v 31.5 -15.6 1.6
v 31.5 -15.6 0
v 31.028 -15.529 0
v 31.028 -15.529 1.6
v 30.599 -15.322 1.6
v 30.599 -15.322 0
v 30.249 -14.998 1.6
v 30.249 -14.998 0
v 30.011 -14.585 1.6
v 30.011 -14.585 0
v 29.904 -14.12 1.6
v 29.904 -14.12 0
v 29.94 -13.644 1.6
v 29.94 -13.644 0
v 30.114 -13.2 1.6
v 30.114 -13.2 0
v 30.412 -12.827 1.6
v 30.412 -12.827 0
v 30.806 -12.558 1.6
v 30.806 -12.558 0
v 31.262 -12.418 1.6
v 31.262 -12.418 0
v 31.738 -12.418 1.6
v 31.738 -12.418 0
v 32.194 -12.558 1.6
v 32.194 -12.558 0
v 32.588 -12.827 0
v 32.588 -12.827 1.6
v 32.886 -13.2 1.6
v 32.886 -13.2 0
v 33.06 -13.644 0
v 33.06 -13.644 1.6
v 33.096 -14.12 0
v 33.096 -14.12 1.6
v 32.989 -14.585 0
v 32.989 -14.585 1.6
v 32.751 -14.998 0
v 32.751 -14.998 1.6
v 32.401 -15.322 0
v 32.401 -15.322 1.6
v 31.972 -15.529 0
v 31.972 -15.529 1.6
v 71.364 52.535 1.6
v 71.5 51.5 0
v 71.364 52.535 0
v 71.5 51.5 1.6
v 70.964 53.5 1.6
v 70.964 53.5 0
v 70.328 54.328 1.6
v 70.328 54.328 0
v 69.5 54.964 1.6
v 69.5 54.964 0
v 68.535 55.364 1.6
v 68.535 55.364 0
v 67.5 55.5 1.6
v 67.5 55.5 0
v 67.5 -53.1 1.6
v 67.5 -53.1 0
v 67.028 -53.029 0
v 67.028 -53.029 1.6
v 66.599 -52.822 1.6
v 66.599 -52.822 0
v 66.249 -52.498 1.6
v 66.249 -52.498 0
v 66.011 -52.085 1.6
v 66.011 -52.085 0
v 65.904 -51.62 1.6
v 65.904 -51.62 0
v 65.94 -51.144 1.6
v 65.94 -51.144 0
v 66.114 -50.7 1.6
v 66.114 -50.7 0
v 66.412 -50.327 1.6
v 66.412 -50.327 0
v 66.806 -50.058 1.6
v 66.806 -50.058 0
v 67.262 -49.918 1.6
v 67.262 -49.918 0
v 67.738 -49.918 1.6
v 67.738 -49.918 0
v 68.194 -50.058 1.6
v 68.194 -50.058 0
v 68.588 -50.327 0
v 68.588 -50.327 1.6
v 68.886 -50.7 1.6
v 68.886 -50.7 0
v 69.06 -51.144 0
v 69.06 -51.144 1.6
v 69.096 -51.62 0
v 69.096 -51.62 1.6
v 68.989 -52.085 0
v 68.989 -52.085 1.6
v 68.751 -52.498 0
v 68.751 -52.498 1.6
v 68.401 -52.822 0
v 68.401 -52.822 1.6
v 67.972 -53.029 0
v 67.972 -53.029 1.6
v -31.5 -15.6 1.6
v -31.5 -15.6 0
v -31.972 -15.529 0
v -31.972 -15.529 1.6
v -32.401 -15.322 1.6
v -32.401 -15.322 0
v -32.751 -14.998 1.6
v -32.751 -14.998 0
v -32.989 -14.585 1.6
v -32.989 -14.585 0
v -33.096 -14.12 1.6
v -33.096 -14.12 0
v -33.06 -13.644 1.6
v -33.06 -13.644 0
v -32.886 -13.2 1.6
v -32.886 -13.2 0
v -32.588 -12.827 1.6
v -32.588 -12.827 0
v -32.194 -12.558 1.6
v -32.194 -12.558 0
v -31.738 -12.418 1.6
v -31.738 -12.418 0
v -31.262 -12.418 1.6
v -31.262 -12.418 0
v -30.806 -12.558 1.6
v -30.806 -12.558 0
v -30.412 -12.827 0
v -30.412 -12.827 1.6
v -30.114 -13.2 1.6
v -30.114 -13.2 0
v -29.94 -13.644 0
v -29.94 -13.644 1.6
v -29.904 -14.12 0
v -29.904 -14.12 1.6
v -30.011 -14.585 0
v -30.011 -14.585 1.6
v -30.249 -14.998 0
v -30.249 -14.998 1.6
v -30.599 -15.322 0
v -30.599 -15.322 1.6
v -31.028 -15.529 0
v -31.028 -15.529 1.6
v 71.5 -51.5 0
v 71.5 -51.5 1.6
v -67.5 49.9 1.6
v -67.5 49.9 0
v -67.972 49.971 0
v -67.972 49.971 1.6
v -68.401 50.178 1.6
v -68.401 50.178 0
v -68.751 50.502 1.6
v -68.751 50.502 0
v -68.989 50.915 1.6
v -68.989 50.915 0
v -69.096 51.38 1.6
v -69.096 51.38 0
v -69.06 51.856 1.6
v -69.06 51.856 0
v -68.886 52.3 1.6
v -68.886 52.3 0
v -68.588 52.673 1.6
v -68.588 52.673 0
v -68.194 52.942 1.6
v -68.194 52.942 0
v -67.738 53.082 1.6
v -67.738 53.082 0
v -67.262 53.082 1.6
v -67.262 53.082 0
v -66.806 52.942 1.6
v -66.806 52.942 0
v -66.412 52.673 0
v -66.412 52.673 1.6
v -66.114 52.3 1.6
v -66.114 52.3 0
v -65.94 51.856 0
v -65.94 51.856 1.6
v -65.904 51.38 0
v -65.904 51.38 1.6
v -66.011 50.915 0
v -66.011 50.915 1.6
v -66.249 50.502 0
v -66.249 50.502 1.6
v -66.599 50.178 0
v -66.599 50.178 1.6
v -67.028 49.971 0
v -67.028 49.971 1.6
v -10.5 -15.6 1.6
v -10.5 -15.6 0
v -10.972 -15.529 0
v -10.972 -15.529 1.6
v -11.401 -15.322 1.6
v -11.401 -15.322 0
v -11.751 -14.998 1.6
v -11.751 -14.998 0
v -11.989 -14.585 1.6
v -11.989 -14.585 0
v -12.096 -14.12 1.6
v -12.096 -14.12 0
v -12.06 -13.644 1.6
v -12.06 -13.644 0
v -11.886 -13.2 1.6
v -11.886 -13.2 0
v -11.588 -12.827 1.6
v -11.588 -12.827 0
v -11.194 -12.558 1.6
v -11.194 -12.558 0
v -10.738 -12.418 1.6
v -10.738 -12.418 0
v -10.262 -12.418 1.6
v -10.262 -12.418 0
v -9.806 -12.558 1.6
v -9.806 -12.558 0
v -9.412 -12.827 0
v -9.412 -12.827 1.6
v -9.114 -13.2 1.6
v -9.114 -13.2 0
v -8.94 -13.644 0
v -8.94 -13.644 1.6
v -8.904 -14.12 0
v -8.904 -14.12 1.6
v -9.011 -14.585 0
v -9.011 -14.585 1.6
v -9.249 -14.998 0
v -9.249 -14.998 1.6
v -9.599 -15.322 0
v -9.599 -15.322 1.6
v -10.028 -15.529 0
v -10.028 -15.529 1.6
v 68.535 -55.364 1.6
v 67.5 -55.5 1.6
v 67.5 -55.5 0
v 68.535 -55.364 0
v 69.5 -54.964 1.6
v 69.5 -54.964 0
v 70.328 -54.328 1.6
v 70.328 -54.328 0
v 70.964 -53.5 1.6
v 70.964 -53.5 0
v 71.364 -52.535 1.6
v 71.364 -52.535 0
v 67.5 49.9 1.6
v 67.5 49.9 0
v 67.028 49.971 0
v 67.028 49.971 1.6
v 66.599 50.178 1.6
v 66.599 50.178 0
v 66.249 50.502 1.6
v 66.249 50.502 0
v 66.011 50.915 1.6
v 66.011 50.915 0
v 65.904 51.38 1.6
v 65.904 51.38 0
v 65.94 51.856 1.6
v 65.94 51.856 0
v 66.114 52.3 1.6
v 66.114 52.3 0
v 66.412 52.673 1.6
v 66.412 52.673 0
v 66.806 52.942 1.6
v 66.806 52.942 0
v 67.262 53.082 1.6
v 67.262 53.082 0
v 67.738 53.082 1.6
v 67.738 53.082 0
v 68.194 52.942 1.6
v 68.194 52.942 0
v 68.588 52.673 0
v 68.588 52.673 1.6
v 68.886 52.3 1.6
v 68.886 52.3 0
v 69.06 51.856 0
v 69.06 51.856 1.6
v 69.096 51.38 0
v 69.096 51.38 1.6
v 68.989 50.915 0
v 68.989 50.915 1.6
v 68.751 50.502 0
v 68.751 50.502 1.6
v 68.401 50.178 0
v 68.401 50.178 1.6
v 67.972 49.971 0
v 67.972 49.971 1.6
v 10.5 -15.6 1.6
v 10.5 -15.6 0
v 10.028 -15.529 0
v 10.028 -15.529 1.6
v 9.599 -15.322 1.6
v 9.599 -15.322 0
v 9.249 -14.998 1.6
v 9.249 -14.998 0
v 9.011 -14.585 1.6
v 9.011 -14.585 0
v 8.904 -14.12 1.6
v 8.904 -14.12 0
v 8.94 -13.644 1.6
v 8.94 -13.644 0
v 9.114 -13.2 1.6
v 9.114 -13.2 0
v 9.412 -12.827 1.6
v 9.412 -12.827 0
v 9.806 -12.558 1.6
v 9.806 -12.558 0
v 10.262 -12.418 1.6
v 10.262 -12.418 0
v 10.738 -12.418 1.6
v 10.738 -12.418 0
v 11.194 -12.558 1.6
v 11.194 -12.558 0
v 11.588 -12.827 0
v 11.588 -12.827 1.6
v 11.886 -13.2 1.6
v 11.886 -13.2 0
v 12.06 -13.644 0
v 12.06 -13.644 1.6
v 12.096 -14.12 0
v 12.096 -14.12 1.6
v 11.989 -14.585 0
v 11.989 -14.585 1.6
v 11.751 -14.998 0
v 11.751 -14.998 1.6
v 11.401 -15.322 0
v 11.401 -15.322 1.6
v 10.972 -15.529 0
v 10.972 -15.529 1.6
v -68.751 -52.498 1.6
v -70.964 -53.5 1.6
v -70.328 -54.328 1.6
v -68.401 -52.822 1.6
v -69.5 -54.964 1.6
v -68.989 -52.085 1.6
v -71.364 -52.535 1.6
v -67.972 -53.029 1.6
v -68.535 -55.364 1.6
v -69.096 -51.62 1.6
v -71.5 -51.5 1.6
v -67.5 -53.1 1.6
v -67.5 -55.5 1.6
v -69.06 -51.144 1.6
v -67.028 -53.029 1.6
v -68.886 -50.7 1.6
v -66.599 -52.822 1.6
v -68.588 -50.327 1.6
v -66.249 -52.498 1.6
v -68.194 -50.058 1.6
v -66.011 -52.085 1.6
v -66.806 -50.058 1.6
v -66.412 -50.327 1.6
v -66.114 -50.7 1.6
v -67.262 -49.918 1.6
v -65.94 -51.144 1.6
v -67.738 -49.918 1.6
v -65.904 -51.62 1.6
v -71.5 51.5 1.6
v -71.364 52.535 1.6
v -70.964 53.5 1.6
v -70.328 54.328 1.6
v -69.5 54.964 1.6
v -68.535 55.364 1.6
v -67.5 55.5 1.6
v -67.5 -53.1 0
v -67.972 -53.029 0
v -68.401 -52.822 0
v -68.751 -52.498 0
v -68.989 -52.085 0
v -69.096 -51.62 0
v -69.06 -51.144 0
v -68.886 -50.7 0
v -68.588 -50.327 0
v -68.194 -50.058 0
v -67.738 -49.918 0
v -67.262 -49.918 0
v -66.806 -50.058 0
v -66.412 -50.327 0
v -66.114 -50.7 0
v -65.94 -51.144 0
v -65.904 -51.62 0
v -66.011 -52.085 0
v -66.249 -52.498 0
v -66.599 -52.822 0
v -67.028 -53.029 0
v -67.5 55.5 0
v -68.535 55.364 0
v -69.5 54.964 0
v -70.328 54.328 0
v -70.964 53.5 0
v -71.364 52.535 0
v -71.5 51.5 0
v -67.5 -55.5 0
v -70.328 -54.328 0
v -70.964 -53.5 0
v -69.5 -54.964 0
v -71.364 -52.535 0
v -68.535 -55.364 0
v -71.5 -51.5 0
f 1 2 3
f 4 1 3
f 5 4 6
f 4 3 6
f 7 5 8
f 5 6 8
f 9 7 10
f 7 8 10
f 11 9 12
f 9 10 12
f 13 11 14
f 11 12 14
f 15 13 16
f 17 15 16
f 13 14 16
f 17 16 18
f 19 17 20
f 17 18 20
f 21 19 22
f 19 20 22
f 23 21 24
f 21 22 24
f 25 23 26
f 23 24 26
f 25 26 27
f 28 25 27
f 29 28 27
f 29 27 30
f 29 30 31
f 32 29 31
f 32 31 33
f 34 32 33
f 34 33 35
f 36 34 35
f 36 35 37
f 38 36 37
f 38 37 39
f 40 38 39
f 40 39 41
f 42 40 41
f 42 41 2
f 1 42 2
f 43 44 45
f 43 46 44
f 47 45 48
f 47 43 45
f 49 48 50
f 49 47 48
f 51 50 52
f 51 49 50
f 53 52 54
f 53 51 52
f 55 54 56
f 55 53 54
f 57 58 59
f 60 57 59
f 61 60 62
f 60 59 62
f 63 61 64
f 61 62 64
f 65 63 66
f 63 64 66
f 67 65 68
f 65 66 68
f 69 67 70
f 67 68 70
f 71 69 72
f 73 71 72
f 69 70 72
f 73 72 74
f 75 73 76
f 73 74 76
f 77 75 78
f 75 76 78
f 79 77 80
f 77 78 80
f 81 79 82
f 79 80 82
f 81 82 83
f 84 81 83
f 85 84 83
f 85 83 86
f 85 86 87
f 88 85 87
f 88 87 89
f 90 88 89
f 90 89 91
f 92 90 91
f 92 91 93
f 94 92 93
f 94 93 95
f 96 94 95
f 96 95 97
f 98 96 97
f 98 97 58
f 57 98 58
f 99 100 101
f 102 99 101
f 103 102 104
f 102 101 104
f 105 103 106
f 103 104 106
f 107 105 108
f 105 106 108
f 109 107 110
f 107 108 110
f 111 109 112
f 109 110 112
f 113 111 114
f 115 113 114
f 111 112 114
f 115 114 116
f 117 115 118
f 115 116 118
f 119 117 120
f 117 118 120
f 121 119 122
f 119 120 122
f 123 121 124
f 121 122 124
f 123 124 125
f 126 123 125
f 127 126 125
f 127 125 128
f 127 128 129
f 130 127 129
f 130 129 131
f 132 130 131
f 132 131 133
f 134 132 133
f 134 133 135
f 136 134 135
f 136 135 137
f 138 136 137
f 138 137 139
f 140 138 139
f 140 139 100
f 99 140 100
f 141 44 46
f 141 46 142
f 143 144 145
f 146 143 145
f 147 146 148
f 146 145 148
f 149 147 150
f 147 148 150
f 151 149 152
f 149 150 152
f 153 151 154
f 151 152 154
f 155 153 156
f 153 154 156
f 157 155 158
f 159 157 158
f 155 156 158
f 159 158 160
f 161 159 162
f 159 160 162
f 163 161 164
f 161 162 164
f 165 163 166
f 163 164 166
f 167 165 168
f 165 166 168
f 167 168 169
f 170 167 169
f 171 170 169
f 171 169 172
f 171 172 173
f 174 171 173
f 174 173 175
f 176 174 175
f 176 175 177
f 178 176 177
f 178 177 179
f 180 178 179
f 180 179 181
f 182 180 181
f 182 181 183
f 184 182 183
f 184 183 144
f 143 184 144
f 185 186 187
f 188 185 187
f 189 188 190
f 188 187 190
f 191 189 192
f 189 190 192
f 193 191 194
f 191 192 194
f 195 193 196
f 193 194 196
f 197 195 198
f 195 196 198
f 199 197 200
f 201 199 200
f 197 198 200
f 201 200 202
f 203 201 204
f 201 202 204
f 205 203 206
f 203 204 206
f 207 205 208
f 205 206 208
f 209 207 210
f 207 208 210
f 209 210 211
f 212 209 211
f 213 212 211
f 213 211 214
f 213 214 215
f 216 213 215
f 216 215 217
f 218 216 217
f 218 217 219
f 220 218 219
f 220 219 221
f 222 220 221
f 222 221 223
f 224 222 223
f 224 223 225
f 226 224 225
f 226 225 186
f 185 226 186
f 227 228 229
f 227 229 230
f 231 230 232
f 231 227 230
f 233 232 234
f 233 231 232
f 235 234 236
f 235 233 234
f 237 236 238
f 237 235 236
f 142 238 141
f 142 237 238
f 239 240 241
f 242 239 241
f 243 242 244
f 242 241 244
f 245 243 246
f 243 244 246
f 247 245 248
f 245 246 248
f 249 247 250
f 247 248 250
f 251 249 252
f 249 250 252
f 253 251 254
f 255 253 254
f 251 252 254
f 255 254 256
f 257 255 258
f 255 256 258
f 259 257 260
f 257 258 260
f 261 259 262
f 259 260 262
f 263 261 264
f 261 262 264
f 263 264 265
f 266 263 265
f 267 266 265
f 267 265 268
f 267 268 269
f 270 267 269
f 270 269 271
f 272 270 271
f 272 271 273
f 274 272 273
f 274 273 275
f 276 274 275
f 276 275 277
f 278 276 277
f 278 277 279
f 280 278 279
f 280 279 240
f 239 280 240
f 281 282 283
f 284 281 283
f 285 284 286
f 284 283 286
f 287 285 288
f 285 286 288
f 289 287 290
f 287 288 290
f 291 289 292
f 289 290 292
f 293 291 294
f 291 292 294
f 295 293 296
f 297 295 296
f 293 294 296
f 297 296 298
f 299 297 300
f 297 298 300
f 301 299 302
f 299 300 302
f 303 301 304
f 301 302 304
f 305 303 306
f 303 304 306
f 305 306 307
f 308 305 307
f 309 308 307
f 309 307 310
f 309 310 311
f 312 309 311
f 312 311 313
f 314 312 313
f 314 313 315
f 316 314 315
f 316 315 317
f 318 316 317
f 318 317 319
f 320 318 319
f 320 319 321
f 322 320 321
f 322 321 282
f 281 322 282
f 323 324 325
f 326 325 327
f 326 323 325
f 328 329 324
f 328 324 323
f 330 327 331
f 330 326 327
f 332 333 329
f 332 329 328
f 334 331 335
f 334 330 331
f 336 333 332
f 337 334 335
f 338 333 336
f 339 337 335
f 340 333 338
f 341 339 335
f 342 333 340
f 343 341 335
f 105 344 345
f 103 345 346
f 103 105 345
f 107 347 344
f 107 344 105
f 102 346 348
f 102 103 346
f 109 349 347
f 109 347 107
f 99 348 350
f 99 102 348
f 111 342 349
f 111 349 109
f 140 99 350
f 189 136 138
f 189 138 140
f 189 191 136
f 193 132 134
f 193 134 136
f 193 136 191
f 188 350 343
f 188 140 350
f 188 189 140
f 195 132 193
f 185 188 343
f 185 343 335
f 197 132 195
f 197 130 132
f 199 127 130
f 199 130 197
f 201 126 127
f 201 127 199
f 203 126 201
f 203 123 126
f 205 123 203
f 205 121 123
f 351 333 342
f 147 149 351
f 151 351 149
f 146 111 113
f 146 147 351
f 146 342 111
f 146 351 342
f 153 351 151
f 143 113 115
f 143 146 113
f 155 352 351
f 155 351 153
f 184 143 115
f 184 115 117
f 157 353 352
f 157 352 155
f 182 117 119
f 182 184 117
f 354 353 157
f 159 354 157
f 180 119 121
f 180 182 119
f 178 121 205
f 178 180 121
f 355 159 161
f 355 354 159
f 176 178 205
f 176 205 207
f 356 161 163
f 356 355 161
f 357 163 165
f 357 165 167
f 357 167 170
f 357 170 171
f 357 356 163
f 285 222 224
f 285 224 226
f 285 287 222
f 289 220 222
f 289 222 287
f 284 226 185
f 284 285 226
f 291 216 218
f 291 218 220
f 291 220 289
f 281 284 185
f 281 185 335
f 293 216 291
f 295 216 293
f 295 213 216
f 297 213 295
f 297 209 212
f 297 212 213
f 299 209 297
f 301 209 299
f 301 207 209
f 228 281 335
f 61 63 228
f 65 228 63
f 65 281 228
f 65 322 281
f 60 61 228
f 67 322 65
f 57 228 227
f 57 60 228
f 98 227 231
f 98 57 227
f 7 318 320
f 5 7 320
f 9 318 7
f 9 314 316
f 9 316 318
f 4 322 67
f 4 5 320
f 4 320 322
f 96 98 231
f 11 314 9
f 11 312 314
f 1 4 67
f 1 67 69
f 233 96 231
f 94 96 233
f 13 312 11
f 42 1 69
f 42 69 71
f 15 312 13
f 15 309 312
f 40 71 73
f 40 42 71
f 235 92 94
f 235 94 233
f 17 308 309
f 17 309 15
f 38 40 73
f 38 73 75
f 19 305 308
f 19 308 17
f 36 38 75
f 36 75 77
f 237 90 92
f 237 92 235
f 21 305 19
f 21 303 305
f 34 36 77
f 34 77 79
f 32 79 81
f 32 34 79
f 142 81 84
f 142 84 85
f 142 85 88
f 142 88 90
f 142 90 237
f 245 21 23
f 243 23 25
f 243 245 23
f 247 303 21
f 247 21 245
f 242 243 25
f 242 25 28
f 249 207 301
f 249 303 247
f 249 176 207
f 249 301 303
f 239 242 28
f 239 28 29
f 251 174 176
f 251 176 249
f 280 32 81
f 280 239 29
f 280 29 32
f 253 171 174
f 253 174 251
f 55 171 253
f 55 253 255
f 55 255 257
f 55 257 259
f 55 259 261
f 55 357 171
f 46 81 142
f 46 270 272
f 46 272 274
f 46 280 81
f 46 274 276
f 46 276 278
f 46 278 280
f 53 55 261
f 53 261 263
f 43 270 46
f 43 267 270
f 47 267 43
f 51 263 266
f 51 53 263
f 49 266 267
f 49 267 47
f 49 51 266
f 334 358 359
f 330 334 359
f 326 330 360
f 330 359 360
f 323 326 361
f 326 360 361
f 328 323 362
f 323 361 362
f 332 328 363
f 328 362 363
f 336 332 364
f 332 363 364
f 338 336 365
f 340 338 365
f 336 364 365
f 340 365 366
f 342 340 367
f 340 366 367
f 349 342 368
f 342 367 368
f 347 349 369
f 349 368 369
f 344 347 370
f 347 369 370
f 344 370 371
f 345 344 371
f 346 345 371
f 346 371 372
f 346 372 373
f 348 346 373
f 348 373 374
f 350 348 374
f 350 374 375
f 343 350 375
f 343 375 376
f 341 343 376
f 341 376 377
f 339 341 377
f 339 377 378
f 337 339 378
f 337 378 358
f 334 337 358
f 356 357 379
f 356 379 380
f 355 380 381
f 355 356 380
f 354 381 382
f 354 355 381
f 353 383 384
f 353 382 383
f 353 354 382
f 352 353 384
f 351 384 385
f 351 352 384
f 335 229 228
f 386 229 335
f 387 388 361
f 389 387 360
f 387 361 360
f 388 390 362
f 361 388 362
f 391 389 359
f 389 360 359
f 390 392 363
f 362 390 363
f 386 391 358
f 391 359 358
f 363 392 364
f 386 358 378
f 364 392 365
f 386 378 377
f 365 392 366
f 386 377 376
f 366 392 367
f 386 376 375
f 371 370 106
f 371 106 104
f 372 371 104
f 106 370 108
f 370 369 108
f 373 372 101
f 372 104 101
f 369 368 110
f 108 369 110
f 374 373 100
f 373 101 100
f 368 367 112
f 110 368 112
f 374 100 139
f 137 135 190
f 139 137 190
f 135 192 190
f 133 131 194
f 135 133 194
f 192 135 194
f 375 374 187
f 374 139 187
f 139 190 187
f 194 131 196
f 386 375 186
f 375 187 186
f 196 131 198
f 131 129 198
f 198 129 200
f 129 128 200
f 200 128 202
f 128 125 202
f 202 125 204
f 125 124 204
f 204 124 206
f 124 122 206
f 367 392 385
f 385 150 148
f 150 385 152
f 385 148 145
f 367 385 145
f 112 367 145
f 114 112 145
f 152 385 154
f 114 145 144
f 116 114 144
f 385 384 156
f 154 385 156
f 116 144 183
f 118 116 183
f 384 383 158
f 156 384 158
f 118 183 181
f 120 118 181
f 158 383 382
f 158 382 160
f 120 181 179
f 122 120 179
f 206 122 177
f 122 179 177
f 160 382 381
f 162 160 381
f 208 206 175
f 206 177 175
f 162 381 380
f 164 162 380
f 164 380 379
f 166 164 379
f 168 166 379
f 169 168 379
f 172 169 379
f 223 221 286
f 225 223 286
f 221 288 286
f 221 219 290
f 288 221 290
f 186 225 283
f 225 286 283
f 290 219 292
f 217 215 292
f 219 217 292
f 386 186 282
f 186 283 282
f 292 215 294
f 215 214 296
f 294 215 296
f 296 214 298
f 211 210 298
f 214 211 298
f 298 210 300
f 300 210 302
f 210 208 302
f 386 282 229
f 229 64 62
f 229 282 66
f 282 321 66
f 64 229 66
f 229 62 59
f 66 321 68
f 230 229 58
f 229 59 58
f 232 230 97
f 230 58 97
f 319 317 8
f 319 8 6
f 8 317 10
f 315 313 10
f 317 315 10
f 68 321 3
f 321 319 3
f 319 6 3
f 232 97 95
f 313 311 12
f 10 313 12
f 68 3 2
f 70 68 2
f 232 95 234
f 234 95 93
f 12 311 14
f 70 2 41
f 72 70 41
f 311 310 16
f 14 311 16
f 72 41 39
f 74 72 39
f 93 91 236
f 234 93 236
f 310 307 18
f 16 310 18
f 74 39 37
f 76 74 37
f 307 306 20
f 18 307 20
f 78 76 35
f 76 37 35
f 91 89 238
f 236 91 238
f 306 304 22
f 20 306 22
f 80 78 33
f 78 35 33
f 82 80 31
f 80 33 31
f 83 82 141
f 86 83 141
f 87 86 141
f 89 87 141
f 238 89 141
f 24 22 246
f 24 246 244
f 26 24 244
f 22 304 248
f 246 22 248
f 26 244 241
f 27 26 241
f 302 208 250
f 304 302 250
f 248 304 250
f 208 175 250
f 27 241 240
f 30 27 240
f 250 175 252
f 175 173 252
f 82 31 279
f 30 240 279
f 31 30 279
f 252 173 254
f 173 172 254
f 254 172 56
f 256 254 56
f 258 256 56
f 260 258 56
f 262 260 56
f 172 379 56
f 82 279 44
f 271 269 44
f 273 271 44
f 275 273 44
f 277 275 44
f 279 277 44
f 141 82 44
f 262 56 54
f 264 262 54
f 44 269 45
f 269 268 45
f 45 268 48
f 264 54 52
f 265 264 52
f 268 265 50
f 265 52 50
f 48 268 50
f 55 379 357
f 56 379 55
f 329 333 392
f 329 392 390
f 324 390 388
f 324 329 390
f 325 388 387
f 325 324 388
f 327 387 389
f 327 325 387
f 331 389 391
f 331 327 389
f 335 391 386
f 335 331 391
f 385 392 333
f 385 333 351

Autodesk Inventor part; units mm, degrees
ref_plane "YZ Plane" through (0, 0, 0) normal (1, 0, 0) x (0, 1, 0)
ref_plane "XZ Plane" through (0, 0, 0) normal (0, 1, 0) x (-1, 0, 0)
ref_plane "XY Plane" through (0, 0, 0) normal (0, 0, 1) x (1, 0, 0)
sketch "Sketch1" plane through (0, 0, 0) normal (0, 0, 1) x (1, 0, 0)
  line L0 (71.5, -55.5) -> (-71.5, -55.5)
  line L1 (-71.5, -55.5) -> (-71.5, 55.5)
  line L2 (-71.5, 55.5) -> (71.5, 55.5)
  line L3 (71.5, 55.5) -> (71.5, -55.5)
  line L4 (71.5, -55.5) -> (-71.5, 55.5) construction
  line L5 (-71.5, -55.5) -> (71.5, 55.5) construction
  point P0 (0, 0)
  dimension "d0" = 143
  dimension "d1" = 111
extrude "Extrusion1" add sketch "Sketch1" along normal blind 1.6
fillet "Fillet1" radius 4 4 edges at (71.5, 55.5, 0.8) (-71.5, 55.5, 0.8) (-71.5, -55.5, 0.8) (71.5, -55.5, 0.8)
sketch "Sketch2" plane through (0, 0, 1.6) normal (0, 0, 1) x (1, 0, 0)
  arc A0 (67.5, -55.5) -> (71.5, -51.5) centre (67.5, -51.5) ccw projected
  line L0 (71.5, -51.5) -> (71.5, 51.5) projected
  arc A1 (71.5, 51.5) -> (67.5, 55.5) centre (67.5, 51.5) ccw projected
  line L1 (67.5, 55.5) -> (-67.5, 55.5) projected
  arc A2 (-67.5, 55.5) -> (-71.5, 51.5) centre (-67.5, 51.5) ccw projected
  line L2 (-71.5, 51.5) -> (-71.5, -51.5) projected
  arc A3 (-71.5, -51.5) -> (-67.5, -55.5) centre (-67.5, -51.5) ccw projected
  line L3 (-67.5, -55.5) -> (67.5, -55.5) projected
  line L4 (-31.5, -14) -> (31.5, -14) construction
  line L5 (-10.5, -14) -> (10.5, -14) construction
  point P0 (0, 0)
  point P1 (0, -14)
  dimension "d9" = 21
  dimension "d17" = 21
  dimension "d18" = 41.5
hole "Hole1" at (-31.5, -14, 1.6) at (31.5, -14, 1.6) at (-10.5, -14, 1.6) at (10.5, -14, 1.6) at (-67.5, 51.5, 1.6) at (67.5, 51.5, 1.6) at (67.5, -51.5, 1.6) at (-67.5, -51.5, 1.6) direction (0, 0, -1) diameter 3.2 end through all
sketch "Sketch3" plane through (0, 0, 1.6) normal (0, 0, 1) x (1, 0, 0)
  line L0 (-67.5, -55.5) -> (67.5, -55.5) projected
  line L1 (-63, -20.5) -> (63, -20.5) construction
  point P0 (0, 0)
  point P1 (-42, -20.5)
  point P2 (-21, -20.5)
  point P3 (0, -20.5)
  point P4 (21, -20.5)
  point P5 (42, -20.5)
  dimension "d21" = 21
  dimension "d26" = 35
sketch "Sketch4" plane through (0, 0, 1.6) normal (0, 0, 1) x (1, 0, 0)
  circle A0 centre (63, -20.5) radius 8 projected
  circle A1 centre (42, -20.5) radius 8 projected
  circle A2 centre (21, -20.5) radius 8 projected
  circle A3 centre (0, -20.5) radius 8 projected
  circle A4 centre (-21, -20.5) radius 8 projected
  circle A5 centre (-42, -20.5) radius 8 projected
  circle A6 centre (-63, -20.5) radius 8 projected
  circle A7 centre (-67.5, -51.5) radius 1.6 projected
  circle A8 centre (67.5, -51.5) radius 1.6 projected
  circle A9 centre (67.5, 51.5) radius 1.6 projected
  circle A10 centre (-67.5, 51.5) radius 1.6 projected
  circle A11 centre (10.5, -14) radius 1.6 projected
  circle A12 centre (-10.5, -14) radius 1.6 projected
  circle A13 centre (31.5, -14) radius 1.6 projected
  circle A14 centre (-31.5, -14) radius 1.6 projected
  arc A15 (67.5, -55.5) -> (71.5, -51.5) centre (67.5, -51.5) ccw projected
  line L0 (71.5, -51.5) -> (71.5, 51.5) projected
  arc A16 (71.5, 51.5) -> (67.5, 55.5) centre (67.5, 51.5) ccw projected
  line L1 (67.5, 55.5) -> (-67.5, 55.5) projected
  arc A17 (-67.5, 55.5) -> (-71.5, 51.5) centre (-67.5, 51.5) ccw projected
  line L2 (-71.5, 51.5) -> (-71.5, -51.5) projected
  arc A18 (-71.5, -51.5) -> (-67.5, -55.5) centre (-67.5, -51.5) ccw projected
  line L3 (-67.5, -55.5) -> (67.5, -55.5) projected
  line L4 (-63, -7.5096) -> (-51.75, -14.0048)
  line L5 (-51.75, -14.0048) -> (-51.75, -26.9952)
  line L6 (-51.75, -26.9952) -> (-63, -33.4904)
  line L7 (-63, -33.4904) -> (-74.25, -26.9952)
  line L8 (-74.25, -26.9952) -> (-74.25, -14.0048)
  line L9 (-74.25, -14.0048) -> (-63, -7.5096)
  line L10 (63, -7.5096) -> (74.25, -14.0048)
  line L11 (74.25, -14.0048) -> (74.25, -26.9952)
  line L12 (74.25, -26.9952) -> (63, -33.4904)
  line L13 (63, -33.4904) -> (51.75, -26.9952)
  line L14 (51.75, -26.9952) -> (51.75, -14.0048)
  line L15 (51.75, -14.0048) -> (63, -7.5096)
  point P0 (0, 0)
  point P1 (71.5, -12.4171)
  point P2 (71.5, -28.5829)
  point P3 (-71.5, -28.5829)
  point P4 (-71.5, -12.4171)
  dimension "d34" = 22.5
  dimension "d35" = 22.5
sketch "Sketch5" plane through (0, 0, 1.6) normal (0, 0, 1) x (1, 0, 0)
  line L0 (-42, -6) -> (42, -6) construction
  line L1 (-67.5, -55.5) -> (67.5, -55.5) projected
  circle A0 centre (-42, -20.5) radius 8 projected
  circle A1 centre (-21, -20.5) radius 8 projected
  circle A2 centre (0, -20.5) radius 8 projected
  circle A3 centre (21, -20.5) radius 8 projected
  circle A4 centre (42, -20.5) radius 8 projected
  point P0 (0, 0)
  point P1 (0, -6)
  point P2 (0, -55.5)
  point P3 (-21, -6)
  point P4 (0, -6)
  point P5 (21, -6)
  dimension "d39" = 49.5
sketch "Sketch6" plane through (0, 0, 1.6) normal (0, 0, 1) x (1, 0, 0)
  line L0 (-67.5, -55.5) -> (67.5, -55.5) construction
  line L1 (-71.5, 51.5) -> (-71.5, -11.2624) construction
  point P0 (0, 0)
  point P1 (-68.5, 13.5)
  point P2 (-63.5, 13.5)
  point P3 (-58.5, 13.5)
  point P4 (-53.5, 13.5)
  dimension "d49" = 5
  dimension "d54" = 69
  dimension "d55" = 3
sketch "Sketch7" plane through (0, 0, 1.6) normal (0, 0, 1) x (1, 0, 0)
  circle A0 centre (-68.5, 13.5) radius 1.7 projected
  line L0 (-68.5, 18.1188) -> (-64.5, 15.8094)
  line L1 (-64.5, 15.8094) -> (-64.5, 11.1906)
  line L2 (-64.5, 11.1906) -> (-68.5, 8.8812)
  line L3 (-68.5, 8.8812) -> (-72.5, 11.1906)
  line L4 (-72.5, 11.1906) -> (-72.5, 15.8094)
  line L5 (-72.5, 15.8094) -> (-68.5, 18.1188)
  line L6 (-71.5, 51.5) -> (-71.5, -11.2624) projected
  point P0 (0, 0)
  point P1 (-71.5, 10.6132)
  point P2 (-71.5, 16.3868)
  dimension "d63" = 1
sketch "Sketch8" plane through (0, 0, 1.6) normal (0, 0, 1) x (1, 0, 0)
  line L0 (68.5, 21.1) -> (34.5, 21.1)
  line L1 (34.5, 21.1) -> (34.5, 40.1)
  line L2 (34.5, 40.1) -> (68.5, 40.1)
  line L3 (68.5, 40.1) -> (68.5, 21.1)
  line L4 (68.5, 21.1) -> (34.5, 40.1) construction
  line L5 (34.5, 21.1) -> (68.5, 40.1) construction
  line L6 (71.5, -11.2624) -> (71.5, 51.5) projected
  line L7 (-67.5, -55.5) -> (67.5, -55.5) projected
  point P0 (0, 0)
  point P1 (51.5, 30.6)
  dimension "d67" = 20
  dimension "d68" = 86.1
  dimension "d69" = 34
  dimension "d70" = 19
sketch "Sketch9" plane through (0, 0, 1.6) normal (0, 0, 1) x (1, 0, 0)
  line L0 (67.25, 14.25) -> (35.75, 14.25)
  line L1 (35.75, 14.25) -> (35.75, 43.95)
  line L2 (35.75, 43.95) -> (67.25, 43.95)
  line L3 (67.25, 43.95) -> (67.25, 14.25)
  line L4 (67.25, 14.25) -> (35.75, 43.95) construction
  line L5 (35.75, 14.25) -> (67.25, 43.95) construction
  line L6 (-67.5, -55.5) -> (67.5, -55.5) projected
  point P0 (0, 0)
  point P1 (51.5, 29.1)
  point P2 (51.5, 30.6)
  dimension "d74" = 31.5
  dimension "d75" = 29.7
  dimension "d76" = 69.75
sketch "Sketch10" plane through (0, 0, 1.6) normal (0, 0, 1) x (1, 0, 0)
  circle A0 centre (35.75, 14.25) radius 3 projected
  circle A1 centre (67.25, 14.25) radius 3 projected
  circle A2 centre (67.25, 43.95) radius 3 projected
  circle A3 centre (35.75, 43.95) radius 3 projected
  line L0 (34.5, 22.1) -> (34.5, 39.1) projected
  arc A4 (35.5, 40.1) -> (34.5, 39.1) centre (35.5, 39.1) ccw projected
  line L1 (35.5, 40.1) -> (67.5, 40.1) projected
  arc A5 (68.5, 39.1) -> (67.5, 40.1) centre (67.5, 39.1) ccw projected
  line L2 (68.5, 39.1) -> (68.5, 22.1) projected
  arc A6 (67.5, 21.1) -> (68.5, 22.1) centre (67.5, 22.1) ccw projected
  line L3 (67.5, 21.1) -> (35.5, 21.1) projected
  arc A7 (34.5, 22.1) -> (35.5, 21.1) centre (35.5, 22.1) ccw projected
  circle A8 centre (-53.5, 13.5) radius 1.7 projected
  circle A9 centre (-58.5, 13.5) radius 1.7 projected
  circle A10 centre (-63.5, 13.5) radius 1.7 projected
  circle A11 centre (-68.5, 13.5) radius 1.7 projected
  circle A12 centre (42, -6) radius 2.75 projected
  circle A13 centre (21, -6) radius 2.75 projected
  circle A14 centre (0, -6) radius 2.75 projected
  circle A15 centre (-21, -6) radius 2.75 projected
  circle A16 centre (-42, -6) radius 2.75 projected
  circle A17 centre (63, -20.5) radius 8 projected
  circle A18 centre (42, -20.5) radius 8 projected
  circle A19 centre (21, -20.5) radius 8 projected
  circle A20 centre (0, -20.5) radius 8 projected
  circle A21 centre (-21, -20.5) radius 8 projected
  circle A22 centre (-42, -20.5) radius 8 projected
  circle A23 centre (-63, -20.5) radius 8 projected
  circle A24 centre (-67.5, -51.5) radius 1.6 projected
  circle A25 centre (67.5, -51.5) radius 1.6 projected
  circle A26 centre (67.5, 51.5) radius 1.6 projected
  circle A27 centre (-67.5, 51.5) radius 1.6 projected
  circle A28 centre (10.5, -14) radius 1.6 projected
  circle A29 centre (-10.5, -14) radius 1.6 projected
  circle A30 centre (31.5, -14) radius 1.6 projected
  circle A31 centre (-31.5, -14) radius 1.6 projected
  arc A32 (-72.5, 11.6236) -> (-72.125, 10.9741) centre (-71.75, 11.6236) ccw projected
  line L4 (-72.125, 10.9741) -> (-71.875, 10.8298) projected
  arc A33 (-71.5, 10.1802) -> (-71.875, 10.8298) centre (-72.25, 10.1802) ccw projected
  line L5 (-71.5, 10.1802) -> (-71.5, -11.2624) projected
  arc A34 (-72.5, -12.9944) -> (-71.5, -11.2624) centre (-73.5, -11.2624) ccw projected
  line L6 (-72.5, -12.9944) -> (-73.25, -13.4275) projected
  arc A35 (-73.25, -13.4275) -> (-74.25, -15.1595) centre (-72.25, -15.1595) ccw projected
  line L7 (-74.25, -15.1595) -> (-74.25, -25.8405) projected
  arc A36 (-74.25, -25.8405) -> (-73.25, -27.5725) centre (-72.25, -25.8405) ccw projected
  line L8 (-73.25, -27.5725) -> (-72.5, -28.0056) projected
  arc A37 (-71.5, -29.7376) -> (-72.5, -28.0056) centre (-73.5, -29.7376) ccw projected
  line L9 (-71.5, -29.7376) -> (-71.5, -51.5) projected
  arc A38 (-71.5, -51.5) -> (-67.5, -55.5) centre (-67.5, -51.5) ccw projected
  line L10 (-67.5, -55.5) -> (67.5, -55.5) projected
  arc A39 (67.5, -55.5) -> (71.5, -51.5) centre (67.5, -51.5) ccw projected
  line L11 (71.5, -51.5) -> (71.5, -29.7376) projected
  arc A40 (72.5, -28.0056) -> (71.5, -29.7376) centre (73.5, -29.7376) ccw projected
  line L12 (72.5, -28.0056) -> (73.25, -27.5725) projected
  arc A41 (73.25, -27.5725) -> (74.25, -25.8405) centre (72.25, -25.8405) ccw projected
  line L13 (74.25, -25.8405) -> (74.25, -15.1595) projected
  arc A42 (74.25, -15.1595) -> (73.25, -13.4275) centre (72.25, -15.1595) ccw projected
  line L14 (73.25, -13.4275) -> (72.5, -12.9944) projected
  arc A43 (71.5, -11.2624) -> (72.5, -12.9944) centre (73.5, -11.2624) ccw projected
  line L15 (71.5, -11.2624) -> (71.5, 51.5) projected
  arc A44 (71.5, 51.5) -> (67.5, 55.5) centre (67.5, 51.5) ccw projected
  line L16 (67.5, 55.5) -> (-67.5, 55.5) projected
  arc A45 (-67.5, 55.5) -> (-71.5, 51.5) centre (-67.5, 51.5) ccw projected
  line L17 (-71.5, 51.5) -> (-71.5, 16.8198) projected
  arc A46 (-71.875, 16.1702) -> (-71.5, 16.8198) centre (-72.25, 16.8198) ccw projected
  line L18 (-71.875, 16.1702) -> (-72.125, 16.0259) projected
  arc A47 (-72.125, 16.0259) -> (-72.5, 15.3764) centre (-71.75, 15.3764) ccw projected
  line L19 (-72.5, 15.3764) -> (-72.5, 11.6236) projected
  line L20 (67.25, 21.4669) -> (73.5, 17.8584)
  line L21 (73.5, 17.8584) -> (73.5, 10.6416)
  line L22 (73.5, 10.6416) -> (67.25, 7.0331)
  line L23 (67.25, 7.0331) -> (61, 10.6416)
  line L24 (61, 10.6416) -> (61, 17.8584)
  line L25 (61, 17.8584) -> (67.25, 21.4669)
  line L26 (67.25, 51.1669) -> (73.5, 47.5584)
  line L27 (73.5, 47.5584) -> (73.5, 40.3416)
  line L28 (73.5, 40.3416) -> (67.25, 36.7331)
  line L29 (67.25, 36.7331) -> (61, 40.3416)
  line L30 (61, 40.3416) -> (61, 47.5584)
  line L31 (61, 47.5584) -> (67.25, 51.1669)
  line L32 (73.5, 40.3416) -> (73.5, 17.8584)
  point P0 (0, 0)
  point P1 (71.5, 48.7131)
  point P2 (71.5, 9.4869)
  dimension "d84" = 2
equation "\"d9\" = d8"
equation "\"d35\" = d34"
equation "\"d8\" = 21"
properties part number "bot_cover_template"
